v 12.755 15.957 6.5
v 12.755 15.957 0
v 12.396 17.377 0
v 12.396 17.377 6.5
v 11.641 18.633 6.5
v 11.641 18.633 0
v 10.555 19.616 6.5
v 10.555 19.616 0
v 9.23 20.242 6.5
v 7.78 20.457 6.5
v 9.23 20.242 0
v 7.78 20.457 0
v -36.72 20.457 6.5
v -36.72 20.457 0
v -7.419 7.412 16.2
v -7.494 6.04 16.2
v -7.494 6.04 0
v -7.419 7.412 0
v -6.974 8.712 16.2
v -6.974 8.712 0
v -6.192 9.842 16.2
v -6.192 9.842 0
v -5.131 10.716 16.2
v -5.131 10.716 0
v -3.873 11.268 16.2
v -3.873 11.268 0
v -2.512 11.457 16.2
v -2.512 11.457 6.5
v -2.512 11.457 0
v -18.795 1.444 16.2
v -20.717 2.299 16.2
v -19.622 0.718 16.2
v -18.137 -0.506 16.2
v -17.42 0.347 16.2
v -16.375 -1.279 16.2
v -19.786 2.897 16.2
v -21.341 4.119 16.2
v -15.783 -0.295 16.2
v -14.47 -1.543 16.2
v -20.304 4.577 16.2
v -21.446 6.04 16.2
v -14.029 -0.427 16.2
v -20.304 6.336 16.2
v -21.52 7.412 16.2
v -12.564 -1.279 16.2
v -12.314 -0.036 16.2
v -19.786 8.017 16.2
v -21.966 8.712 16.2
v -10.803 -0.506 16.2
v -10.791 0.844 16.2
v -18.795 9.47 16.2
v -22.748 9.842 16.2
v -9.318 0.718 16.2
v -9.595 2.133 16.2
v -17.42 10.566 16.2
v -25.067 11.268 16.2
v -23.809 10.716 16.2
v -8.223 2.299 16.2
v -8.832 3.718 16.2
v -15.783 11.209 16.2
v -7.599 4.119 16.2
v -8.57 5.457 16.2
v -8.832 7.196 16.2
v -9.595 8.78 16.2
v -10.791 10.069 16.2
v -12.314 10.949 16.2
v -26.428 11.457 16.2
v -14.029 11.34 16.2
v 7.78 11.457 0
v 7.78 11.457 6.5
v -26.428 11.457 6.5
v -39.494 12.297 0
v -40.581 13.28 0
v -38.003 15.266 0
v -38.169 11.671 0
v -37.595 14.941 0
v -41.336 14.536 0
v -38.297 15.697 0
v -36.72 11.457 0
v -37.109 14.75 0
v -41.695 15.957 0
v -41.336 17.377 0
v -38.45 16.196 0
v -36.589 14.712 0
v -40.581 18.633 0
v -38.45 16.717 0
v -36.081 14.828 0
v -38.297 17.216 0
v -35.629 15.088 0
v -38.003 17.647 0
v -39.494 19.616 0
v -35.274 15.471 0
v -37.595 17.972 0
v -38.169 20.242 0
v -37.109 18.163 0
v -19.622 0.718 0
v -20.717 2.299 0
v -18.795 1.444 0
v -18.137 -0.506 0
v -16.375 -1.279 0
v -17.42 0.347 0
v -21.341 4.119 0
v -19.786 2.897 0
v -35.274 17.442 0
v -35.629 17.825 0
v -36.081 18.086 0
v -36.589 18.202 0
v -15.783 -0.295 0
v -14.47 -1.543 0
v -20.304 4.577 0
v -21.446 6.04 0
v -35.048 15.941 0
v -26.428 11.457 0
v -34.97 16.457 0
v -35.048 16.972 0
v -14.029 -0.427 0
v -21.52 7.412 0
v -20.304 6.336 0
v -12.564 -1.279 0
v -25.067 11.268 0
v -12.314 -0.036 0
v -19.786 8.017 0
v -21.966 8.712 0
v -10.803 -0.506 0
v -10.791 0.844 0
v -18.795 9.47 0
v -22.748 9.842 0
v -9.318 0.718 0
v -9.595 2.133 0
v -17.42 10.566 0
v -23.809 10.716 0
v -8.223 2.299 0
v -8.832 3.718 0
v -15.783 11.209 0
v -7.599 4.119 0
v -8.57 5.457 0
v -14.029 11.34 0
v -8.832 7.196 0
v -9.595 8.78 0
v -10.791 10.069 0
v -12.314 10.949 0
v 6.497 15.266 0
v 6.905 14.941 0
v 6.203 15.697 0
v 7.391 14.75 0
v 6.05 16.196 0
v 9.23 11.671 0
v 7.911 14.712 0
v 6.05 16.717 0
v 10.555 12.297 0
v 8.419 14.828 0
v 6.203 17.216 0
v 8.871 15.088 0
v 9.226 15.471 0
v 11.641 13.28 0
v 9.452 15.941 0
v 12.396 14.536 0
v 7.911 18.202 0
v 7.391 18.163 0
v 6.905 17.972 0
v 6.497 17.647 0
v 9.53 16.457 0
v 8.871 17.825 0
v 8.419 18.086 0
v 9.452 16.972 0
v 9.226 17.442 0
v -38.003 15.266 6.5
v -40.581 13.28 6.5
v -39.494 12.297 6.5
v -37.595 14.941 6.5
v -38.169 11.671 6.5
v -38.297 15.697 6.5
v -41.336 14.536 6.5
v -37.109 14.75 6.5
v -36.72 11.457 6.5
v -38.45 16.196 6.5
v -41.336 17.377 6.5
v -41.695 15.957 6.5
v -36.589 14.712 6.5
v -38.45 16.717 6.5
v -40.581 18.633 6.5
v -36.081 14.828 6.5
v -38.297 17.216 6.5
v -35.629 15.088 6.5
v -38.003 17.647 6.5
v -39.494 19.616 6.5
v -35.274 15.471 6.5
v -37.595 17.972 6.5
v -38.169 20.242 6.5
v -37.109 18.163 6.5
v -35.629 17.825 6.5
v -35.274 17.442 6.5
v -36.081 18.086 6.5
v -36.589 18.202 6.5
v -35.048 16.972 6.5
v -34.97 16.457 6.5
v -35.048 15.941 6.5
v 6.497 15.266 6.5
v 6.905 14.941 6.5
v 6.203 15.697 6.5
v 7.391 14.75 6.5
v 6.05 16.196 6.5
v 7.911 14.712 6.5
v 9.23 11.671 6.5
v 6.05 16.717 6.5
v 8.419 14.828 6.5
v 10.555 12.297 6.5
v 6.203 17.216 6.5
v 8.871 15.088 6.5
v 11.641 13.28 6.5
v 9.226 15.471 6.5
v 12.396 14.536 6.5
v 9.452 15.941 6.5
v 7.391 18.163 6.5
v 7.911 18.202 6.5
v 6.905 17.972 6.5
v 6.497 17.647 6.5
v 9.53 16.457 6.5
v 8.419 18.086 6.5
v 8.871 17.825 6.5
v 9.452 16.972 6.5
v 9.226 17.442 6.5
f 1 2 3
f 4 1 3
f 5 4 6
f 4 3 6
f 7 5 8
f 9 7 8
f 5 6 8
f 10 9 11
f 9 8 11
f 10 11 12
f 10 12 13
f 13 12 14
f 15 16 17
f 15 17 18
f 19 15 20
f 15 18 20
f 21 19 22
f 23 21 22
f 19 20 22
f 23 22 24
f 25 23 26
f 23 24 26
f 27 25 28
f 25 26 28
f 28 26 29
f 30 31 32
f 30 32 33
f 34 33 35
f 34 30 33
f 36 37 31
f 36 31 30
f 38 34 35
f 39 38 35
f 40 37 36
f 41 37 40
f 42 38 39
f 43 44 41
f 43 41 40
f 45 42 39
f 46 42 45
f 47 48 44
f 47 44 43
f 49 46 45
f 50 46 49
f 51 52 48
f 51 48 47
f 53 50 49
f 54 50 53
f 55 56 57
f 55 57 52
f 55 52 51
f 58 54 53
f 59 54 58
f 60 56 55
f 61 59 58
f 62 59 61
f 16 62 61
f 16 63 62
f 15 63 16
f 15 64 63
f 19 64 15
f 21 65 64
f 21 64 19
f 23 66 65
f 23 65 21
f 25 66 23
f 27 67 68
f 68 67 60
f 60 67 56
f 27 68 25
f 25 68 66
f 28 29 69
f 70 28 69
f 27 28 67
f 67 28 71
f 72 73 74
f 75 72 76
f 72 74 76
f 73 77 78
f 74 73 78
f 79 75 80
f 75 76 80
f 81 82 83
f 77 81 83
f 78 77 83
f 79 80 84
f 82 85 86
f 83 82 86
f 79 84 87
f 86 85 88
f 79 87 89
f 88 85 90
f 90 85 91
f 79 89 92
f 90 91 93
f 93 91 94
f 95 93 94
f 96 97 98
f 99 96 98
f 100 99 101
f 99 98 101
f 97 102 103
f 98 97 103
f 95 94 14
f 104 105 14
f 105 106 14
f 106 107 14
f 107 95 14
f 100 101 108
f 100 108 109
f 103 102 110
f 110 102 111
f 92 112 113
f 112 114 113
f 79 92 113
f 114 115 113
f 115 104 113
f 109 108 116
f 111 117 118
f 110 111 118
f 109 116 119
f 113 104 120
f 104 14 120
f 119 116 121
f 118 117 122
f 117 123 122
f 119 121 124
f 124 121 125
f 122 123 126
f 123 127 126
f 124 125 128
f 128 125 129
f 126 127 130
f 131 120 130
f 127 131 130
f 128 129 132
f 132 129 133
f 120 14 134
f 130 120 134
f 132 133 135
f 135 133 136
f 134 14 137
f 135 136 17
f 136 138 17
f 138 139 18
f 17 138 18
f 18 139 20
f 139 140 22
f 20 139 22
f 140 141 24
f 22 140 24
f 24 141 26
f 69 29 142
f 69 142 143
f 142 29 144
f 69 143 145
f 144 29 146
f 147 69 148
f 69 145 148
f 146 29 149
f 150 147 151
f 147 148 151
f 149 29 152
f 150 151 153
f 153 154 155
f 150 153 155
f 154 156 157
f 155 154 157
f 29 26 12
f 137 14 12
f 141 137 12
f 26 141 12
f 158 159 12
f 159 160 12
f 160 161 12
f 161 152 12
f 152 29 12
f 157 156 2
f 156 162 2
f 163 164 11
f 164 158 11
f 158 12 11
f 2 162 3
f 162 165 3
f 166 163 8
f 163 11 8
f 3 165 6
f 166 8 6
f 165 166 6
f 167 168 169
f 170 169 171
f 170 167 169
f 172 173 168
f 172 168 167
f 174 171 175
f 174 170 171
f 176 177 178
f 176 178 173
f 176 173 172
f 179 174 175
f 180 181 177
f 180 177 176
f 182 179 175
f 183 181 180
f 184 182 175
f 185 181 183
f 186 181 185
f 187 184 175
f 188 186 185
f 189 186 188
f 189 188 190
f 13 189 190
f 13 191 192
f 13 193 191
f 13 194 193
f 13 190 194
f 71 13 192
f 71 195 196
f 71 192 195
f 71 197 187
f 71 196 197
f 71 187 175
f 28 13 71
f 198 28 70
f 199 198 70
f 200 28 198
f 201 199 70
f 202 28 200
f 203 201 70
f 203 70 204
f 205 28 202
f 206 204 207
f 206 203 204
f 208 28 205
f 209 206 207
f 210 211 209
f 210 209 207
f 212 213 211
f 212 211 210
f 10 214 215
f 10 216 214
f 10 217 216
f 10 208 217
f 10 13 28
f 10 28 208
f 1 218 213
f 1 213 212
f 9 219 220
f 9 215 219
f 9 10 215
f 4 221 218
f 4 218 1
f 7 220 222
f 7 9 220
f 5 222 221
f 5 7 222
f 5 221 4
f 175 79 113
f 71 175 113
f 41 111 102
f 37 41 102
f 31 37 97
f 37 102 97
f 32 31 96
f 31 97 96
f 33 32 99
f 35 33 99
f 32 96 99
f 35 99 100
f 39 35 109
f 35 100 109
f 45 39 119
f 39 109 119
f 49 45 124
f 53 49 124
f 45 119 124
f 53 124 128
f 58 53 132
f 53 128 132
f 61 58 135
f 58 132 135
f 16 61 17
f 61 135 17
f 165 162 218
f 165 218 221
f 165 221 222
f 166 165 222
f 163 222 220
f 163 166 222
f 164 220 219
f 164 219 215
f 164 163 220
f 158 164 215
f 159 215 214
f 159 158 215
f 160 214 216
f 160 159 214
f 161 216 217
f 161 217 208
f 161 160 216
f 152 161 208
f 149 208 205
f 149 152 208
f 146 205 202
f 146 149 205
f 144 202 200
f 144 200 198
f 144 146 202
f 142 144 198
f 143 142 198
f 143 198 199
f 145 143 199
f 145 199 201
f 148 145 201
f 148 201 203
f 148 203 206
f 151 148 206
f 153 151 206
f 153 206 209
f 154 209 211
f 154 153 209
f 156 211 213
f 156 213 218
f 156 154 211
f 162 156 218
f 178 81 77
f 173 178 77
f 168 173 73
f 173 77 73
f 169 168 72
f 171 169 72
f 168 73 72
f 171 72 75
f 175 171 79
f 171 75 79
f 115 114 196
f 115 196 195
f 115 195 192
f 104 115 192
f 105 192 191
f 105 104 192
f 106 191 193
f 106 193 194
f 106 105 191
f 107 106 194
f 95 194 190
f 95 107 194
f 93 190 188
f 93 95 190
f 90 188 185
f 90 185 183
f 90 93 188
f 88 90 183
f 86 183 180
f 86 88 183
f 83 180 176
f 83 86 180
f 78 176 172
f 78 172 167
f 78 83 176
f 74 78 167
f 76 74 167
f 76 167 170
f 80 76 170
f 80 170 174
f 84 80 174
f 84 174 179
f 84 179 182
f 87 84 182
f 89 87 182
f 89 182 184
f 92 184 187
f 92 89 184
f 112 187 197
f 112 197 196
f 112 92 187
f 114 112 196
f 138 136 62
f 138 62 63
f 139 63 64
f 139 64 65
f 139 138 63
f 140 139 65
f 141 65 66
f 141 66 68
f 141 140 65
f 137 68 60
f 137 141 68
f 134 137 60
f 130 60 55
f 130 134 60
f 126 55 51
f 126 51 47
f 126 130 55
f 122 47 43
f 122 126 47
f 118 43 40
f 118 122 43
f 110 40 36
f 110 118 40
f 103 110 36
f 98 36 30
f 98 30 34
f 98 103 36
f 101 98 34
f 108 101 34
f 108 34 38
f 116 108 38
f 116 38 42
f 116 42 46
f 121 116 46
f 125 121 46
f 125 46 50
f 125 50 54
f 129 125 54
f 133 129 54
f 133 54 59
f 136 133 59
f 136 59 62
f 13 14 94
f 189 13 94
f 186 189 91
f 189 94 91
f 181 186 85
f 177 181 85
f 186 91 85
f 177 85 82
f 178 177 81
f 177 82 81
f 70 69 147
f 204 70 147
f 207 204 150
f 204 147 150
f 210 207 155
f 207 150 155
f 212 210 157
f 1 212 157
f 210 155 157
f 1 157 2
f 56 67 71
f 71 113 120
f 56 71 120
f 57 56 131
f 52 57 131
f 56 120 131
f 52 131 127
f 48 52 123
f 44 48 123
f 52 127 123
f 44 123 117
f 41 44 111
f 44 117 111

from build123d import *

# Parameters (mm, degrees)
F0_R     = 1.75
F0_R_2   = 5.9
F1_DEPTH = 6.5
F2_DEPTH = 16.2


with BuildPart() as f1:
    # F0 (on Top) → F1 (new body)
    with BuildSketch(Plane.XY):
        with BuildLine():
            Line((7.780111, 20.456612), (-36.719889, 20.456612))
            ThreePointArc((-36.719889, 20.456612), (-40.073991, 19.164712), (-41.694827, 15.956612))
            ThreePointArc((-41.694827, 15.956612), (-40.073991, 12.748513), (-36.719889, 11.456612))
            Line((-36.719889, 11.456612), (-26.42815, 11.456612))
            Line((-26.42815, 11.456612), (-2.511629, 11.456612))
            Line((-2.511629, 11.456612), (7.780111, 11.456612))
            ThreePointArc((7.780111, 11.456612), (11.134213, 12.748513), (12.755048, 15.956612))
            ThreePointArc((12.755048, 15.956612), (11.134213, 19.164712), (7.780111, 20.456612))
        make_face()
        with Locations((-36.719889, 16.456612)):
            Circle(F0_R, mode=Mode.SUBTRACT)
        with Locations((7.780111, 16.456612)):
            Circle(F0_R, mode=Mode.SUBTRACT)
        with BuildLine():
            Line((-2.511629, 11.456612), (-26.42815, 11.456612))
            ThreePointArc((-26.42815, 11.456612), (-22.74825, 9.841628), (-21.445541, 6.039946))
            ThreePointArc((-21.445541, 6.039946), (-14.469889, -1.543388), (-7.494237, 6.039946))
            ThreePointArc((-7.494237, 6.039946), (-6.191529, 9.841628), (-2.511629, 11.456612))
        make_face()
        with Locations((-14.469889, 5.456612)):
            Circle(F0_R_2, mode=Mode.SUBTRACT)
    extrude(amount=F1_DEPTH)

    # F0 (on Top) → F2 (join)
    with BuildSketch(Plane.XY):
        with BuildLine():
            Line((-2.511629, 11.456612), (-26.42815, 11.456612))
            ThreePointArc((-26.42815, 11.456612), (-22.74825, 9.841628), (-21.445541, 6.039946))
            ThreePointArc((-21.445541, 6.039946), (-14.469889, -1.543388), (-7.494237, 6.039946))
            ThreePointArc((-7.494237, 6.039946), (-6.191529, 9.841628), (-2.511629, 11.456612))
        make_face()
        with Locations((-14.469889, 5.456612)):
            Circle(F0_R_2, mode=Mode.SUBTRACT)
    extrude(amount=F2_DEPTH)


solid = f1.part
